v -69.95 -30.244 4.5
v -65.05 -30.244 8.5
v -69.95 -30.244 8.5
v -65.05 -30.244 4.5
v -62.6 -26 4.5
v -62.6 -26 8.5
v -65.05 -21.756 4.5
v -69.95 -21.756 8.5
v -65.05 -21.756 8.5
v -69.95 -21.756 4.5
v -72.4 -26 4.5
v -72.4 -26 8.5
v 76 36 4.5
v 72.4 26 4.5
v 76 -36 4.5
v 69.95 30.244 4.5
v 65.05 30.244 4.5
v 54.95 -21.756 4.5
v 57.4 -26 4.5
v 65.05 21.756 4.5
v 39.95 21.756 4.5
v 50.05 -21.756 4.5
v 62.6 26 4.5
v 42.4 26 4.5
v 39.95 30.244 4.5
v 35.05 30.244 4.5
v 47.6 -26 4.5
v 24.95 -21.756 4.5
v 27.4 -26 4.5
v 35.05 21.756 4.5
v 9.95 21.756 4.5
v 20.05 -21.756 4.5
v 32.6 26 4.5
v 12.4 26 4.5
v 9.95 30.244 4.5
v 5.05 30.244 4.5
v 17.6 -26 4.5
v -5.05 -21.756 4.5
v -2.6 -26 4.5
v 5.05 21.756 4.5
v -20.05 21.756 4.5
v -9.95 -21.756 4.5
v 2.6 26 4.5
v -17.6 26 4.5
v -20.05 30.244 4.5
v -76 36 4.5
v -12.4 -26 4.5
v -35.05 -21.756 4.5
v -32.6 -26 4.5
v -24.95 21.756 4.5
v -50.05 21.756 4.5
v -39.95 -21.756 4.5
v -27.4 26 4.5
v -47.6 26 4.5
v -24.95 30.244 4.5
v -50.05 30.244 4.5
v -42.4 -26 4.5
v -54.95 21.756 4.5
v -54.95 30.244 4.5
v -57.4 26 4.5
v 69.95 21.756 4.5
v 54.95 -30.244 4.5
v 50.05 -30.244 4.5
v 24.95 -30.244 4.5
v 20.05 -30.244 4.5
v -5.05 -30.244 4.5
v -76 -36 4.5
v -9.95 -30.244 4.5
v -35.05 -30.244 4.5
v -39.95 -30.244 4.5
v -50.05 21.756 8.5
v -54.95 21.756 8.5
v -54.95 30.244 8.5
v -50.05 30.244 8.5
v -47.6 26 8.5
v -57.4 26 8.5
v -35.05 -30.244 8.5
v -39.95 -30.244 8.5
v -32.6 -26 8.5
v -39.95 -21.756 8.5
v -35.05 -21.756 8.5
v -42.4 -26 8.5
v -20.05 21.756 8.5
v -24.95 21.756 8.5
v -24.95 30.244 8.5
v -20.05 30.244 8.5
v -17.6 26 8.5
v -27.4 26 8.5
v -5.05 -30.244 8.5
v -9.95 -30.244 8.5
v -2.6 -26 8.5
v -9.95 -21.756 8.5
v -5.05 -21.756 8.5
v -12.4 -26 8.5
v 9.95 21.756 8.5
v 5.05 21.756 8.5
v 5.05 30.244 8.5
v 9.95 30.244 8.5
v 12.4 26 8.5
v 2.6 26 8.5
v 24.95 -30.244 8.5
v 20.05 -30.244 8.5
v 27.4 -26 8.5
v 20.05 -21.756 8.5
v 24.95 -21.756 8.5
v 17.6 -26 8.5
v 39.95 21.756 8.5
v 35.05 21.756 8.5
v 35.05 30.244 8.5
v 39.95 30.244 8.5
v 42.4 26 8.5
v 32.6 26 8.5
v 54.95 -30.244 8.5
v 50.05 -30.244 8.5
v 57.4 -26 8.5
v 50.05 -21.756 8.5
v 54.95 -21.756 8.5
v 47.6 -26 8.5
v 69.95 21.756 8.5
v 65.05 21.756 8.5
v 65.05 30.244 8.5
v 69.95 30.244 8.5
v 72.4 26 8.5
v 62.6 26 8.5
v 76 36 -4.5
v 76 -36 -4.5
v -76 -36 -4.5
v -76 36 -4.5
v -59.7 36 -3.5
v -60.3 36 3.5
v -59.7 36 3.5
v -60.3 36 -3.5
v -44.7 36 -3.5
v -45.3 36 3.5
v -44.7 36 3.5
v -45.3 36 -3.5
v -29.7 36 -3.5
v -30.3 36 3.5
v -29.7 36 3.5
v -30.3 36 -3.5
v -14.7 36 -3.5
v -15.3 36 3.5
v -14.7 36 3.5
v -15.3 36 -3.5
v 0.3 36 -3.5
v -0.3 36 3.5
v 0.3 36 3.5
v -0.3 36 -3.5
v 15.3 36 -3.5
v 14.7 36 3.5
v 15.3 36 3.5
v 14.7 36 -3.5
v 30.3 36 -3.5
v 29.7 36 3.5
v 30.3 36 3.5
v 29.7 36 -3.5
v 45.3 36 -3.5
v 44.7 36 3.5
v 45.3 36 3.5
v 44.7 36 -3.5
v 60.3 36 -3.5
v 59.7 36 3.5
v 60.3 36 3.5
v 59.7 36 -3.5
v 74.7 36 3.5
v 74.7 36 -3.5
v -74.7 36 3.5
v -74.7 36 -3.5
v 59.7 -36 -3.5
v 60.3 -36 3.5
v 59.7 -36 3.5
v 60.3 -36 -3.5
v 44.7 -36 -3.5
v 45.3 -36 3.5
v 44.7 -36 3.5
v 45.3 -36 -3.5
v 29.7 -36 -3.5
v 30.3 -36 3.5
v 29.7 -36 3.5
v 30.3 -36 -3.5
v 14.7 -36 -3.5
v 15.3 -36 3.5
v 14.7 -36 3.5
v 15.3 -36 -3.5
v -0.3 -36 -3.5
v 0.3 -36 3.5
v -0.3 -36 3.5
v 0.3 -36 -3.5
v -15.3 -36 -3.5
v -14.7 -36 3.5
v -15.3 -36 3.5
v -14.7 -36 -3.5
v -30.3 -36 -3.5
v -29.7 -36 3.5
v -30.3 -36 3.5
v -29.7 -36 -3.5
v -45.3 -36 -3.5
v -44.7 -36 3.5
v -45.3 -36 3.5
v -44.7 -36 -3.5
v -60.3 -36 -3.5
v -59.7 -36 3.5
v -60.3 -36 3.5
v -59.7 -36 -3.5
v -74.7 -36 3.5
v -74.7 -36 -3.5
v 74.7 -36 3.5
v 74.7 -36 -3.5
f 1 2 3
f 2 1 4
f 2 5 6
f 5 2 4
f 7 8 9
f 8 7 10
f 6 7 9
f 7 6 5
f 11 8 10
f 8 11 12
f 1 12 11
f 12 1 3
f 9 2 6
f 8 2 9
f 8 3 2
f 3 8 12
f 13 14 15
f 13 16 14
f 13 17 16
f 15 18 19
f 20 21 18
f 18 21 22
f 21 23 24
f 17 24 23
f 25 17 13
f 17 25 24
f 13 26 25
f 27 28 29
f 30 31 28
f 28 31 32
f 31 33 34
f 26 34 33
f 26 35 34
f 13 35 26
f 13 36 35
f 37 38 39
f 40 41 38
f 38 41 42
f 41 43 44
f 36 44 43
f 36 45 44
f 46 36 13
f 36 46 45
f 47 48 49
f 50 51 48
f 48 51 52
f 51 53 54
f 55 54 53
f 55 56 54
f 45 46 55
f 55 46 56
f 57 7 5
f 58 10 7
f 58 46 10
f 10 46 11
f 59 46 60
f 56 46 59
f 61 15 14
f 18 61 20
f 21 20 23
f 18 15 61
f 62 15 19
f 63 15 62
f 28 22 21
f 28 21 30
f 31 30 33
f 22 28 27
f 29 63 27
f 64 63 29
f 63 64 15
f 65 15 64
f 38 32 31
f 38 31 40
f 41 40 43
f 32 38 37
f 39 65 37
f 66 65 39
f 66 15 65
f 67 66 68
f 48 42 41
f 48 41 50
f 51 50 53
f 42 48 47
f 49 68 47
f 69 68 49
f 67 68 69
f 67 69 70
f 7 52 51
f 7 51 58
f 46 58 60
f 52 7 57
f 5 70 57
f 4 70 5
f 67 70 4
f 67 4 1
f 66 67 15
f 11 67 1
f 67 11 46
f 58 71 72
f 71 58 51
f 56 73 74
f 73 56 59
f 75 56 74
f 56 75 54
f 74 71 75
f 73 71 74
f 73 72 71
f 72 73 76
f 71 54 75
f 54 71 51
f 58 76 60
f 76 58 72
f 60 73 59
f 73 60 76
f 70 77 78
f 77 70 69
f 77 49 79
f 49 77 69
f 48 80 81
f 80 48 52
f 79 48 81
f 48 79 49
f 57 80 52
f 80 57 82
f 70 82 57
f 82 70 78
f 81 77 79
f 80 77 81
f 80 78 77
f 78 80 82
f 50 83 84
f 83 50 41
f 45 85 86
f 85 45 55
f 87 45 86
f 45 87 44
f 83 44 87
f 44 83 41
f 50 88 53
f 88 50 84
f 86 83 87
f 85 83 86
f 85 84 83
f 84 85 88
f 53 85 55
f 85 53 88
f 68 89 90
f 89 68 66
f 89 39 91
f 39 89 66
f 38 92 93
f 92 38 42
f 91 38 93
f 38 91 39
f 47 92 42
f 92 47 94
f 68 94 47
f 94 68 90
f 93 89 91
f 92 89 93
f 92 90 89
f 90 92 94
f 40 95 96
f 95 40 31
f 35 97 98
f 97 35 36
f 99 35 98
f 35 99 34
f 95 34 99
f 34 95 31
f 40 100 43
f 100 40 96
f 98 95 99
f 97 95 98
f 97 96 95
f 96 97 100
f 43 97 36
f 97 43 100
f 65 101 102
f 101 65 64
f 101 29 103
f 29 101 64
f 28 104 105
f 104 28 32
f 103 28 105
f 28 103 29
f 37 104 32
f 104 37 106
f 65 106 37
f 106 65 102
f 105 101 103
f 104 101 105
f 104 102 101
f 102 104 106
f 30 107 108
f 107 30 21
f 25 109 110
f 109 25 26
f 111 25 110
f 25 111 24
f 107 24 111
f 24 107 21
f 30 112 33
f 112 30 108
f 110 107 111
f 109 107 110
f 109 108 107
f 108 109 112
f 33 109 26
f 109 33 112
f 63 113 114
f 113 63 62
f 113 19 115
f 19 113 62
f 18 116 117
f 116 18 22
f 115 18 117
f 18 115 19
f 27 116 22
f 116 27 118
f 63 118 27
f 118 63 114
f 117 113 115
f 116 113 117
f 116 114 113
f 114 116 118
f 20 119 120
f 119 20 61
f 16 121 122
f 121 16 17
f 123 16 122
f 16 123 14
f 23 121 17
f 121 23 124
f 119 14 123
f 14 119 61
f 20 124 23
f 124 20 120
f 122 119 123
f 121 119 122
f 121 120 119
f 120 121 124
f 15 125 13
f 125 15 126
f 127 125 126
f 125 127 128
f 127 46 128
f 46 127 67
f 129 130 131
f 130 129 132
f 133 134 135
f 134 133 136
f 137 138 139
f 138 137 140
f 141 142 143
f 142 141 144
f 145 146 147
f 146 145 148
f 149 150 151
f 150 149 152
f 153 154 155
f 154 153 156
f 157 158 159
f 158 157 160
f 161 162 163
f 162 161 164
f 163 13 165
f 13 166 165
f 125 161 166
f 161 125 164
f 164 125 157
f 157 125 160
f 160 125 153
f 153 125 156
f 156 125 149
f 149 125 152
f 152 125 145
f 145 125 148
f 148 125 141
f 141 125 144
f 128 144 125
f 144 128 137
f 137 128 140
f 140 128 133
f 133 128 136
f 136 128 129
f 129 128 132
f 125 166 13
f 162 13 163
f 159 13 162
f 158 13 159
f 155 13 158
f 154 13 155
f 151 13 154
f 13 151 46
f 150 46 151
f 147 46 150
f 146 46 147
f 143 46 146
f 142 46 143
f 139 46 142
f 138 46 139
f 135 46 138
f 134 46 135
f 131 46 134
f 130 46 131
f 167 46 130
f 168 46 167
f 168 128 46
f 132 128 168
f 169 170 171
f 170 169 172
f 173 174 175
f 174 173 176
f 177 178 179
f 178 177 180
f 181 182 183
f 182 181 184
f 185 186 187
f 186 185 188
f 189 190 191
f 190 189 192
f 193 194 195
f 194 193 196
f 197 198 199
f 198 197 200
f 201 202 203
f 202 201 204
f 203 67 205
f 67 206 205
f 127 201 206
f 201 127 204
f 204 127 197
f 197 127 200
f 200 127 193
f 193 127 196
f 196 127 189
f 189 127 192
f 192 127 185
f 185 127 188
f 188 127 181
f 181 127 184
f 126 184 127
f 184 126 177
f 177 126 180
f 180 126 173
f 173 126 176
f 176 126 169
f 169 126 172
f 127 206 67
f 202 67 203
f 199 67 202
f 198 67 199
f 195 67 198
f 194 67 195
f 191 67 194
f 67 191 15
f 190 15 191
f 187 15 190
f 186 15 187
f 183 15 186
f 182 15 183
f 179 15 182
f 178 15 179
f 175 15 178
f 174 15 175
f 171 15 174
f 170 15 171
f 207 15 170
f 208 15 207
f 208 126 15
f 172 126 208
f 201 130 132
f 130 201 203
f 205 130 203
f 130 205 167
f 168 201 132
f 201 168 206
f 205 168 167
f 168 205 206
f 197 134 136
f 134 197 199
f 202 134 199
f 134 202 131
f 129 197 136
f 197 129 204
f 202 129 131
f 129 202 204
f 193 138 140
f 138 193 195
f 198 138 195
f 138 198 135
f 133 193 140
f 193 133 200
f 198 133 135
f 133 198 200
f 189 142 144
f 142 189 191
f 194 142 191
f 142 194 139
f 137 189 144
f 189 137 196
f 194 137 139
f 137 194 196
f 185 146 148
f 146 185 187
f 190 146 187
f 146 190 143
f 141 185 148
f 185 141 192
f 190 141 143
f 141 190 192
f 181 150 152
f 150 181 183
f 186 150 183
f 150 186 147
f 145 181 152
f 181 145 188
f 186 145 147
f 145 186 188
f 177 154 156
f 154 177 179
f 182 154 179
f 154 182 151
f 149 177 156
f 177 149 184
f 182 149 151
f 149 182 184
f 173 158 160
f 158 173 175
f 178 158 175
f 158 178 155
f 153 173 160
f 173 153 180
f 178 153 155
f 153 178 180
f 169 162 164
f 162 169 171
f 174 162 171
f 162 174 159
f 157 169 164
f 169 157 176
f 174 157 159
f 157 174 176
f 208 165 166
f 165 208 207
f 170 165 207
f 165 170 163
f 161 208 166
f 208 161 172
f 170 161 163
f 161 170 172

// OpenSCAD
$fn=100;
n=10;
w=15;
l=72;

difference(){
union(){
cube([n*w+2,l,2+6+1],center=true);

for (i = [0 : n - 1]) {
s=(i%2)*2-1;
translate([0,s*(10+16),0])
translate([(i-n/2)*w+w/2,0,4.5])
cylinder(r=4.9,h=4,$fn=6);
}
}

for (i = [0 : n - 1]) {
translate([(i-n/2)*w+w/2,0,0])
cube([14.4,l+0.1,7],center=true);
}
}
